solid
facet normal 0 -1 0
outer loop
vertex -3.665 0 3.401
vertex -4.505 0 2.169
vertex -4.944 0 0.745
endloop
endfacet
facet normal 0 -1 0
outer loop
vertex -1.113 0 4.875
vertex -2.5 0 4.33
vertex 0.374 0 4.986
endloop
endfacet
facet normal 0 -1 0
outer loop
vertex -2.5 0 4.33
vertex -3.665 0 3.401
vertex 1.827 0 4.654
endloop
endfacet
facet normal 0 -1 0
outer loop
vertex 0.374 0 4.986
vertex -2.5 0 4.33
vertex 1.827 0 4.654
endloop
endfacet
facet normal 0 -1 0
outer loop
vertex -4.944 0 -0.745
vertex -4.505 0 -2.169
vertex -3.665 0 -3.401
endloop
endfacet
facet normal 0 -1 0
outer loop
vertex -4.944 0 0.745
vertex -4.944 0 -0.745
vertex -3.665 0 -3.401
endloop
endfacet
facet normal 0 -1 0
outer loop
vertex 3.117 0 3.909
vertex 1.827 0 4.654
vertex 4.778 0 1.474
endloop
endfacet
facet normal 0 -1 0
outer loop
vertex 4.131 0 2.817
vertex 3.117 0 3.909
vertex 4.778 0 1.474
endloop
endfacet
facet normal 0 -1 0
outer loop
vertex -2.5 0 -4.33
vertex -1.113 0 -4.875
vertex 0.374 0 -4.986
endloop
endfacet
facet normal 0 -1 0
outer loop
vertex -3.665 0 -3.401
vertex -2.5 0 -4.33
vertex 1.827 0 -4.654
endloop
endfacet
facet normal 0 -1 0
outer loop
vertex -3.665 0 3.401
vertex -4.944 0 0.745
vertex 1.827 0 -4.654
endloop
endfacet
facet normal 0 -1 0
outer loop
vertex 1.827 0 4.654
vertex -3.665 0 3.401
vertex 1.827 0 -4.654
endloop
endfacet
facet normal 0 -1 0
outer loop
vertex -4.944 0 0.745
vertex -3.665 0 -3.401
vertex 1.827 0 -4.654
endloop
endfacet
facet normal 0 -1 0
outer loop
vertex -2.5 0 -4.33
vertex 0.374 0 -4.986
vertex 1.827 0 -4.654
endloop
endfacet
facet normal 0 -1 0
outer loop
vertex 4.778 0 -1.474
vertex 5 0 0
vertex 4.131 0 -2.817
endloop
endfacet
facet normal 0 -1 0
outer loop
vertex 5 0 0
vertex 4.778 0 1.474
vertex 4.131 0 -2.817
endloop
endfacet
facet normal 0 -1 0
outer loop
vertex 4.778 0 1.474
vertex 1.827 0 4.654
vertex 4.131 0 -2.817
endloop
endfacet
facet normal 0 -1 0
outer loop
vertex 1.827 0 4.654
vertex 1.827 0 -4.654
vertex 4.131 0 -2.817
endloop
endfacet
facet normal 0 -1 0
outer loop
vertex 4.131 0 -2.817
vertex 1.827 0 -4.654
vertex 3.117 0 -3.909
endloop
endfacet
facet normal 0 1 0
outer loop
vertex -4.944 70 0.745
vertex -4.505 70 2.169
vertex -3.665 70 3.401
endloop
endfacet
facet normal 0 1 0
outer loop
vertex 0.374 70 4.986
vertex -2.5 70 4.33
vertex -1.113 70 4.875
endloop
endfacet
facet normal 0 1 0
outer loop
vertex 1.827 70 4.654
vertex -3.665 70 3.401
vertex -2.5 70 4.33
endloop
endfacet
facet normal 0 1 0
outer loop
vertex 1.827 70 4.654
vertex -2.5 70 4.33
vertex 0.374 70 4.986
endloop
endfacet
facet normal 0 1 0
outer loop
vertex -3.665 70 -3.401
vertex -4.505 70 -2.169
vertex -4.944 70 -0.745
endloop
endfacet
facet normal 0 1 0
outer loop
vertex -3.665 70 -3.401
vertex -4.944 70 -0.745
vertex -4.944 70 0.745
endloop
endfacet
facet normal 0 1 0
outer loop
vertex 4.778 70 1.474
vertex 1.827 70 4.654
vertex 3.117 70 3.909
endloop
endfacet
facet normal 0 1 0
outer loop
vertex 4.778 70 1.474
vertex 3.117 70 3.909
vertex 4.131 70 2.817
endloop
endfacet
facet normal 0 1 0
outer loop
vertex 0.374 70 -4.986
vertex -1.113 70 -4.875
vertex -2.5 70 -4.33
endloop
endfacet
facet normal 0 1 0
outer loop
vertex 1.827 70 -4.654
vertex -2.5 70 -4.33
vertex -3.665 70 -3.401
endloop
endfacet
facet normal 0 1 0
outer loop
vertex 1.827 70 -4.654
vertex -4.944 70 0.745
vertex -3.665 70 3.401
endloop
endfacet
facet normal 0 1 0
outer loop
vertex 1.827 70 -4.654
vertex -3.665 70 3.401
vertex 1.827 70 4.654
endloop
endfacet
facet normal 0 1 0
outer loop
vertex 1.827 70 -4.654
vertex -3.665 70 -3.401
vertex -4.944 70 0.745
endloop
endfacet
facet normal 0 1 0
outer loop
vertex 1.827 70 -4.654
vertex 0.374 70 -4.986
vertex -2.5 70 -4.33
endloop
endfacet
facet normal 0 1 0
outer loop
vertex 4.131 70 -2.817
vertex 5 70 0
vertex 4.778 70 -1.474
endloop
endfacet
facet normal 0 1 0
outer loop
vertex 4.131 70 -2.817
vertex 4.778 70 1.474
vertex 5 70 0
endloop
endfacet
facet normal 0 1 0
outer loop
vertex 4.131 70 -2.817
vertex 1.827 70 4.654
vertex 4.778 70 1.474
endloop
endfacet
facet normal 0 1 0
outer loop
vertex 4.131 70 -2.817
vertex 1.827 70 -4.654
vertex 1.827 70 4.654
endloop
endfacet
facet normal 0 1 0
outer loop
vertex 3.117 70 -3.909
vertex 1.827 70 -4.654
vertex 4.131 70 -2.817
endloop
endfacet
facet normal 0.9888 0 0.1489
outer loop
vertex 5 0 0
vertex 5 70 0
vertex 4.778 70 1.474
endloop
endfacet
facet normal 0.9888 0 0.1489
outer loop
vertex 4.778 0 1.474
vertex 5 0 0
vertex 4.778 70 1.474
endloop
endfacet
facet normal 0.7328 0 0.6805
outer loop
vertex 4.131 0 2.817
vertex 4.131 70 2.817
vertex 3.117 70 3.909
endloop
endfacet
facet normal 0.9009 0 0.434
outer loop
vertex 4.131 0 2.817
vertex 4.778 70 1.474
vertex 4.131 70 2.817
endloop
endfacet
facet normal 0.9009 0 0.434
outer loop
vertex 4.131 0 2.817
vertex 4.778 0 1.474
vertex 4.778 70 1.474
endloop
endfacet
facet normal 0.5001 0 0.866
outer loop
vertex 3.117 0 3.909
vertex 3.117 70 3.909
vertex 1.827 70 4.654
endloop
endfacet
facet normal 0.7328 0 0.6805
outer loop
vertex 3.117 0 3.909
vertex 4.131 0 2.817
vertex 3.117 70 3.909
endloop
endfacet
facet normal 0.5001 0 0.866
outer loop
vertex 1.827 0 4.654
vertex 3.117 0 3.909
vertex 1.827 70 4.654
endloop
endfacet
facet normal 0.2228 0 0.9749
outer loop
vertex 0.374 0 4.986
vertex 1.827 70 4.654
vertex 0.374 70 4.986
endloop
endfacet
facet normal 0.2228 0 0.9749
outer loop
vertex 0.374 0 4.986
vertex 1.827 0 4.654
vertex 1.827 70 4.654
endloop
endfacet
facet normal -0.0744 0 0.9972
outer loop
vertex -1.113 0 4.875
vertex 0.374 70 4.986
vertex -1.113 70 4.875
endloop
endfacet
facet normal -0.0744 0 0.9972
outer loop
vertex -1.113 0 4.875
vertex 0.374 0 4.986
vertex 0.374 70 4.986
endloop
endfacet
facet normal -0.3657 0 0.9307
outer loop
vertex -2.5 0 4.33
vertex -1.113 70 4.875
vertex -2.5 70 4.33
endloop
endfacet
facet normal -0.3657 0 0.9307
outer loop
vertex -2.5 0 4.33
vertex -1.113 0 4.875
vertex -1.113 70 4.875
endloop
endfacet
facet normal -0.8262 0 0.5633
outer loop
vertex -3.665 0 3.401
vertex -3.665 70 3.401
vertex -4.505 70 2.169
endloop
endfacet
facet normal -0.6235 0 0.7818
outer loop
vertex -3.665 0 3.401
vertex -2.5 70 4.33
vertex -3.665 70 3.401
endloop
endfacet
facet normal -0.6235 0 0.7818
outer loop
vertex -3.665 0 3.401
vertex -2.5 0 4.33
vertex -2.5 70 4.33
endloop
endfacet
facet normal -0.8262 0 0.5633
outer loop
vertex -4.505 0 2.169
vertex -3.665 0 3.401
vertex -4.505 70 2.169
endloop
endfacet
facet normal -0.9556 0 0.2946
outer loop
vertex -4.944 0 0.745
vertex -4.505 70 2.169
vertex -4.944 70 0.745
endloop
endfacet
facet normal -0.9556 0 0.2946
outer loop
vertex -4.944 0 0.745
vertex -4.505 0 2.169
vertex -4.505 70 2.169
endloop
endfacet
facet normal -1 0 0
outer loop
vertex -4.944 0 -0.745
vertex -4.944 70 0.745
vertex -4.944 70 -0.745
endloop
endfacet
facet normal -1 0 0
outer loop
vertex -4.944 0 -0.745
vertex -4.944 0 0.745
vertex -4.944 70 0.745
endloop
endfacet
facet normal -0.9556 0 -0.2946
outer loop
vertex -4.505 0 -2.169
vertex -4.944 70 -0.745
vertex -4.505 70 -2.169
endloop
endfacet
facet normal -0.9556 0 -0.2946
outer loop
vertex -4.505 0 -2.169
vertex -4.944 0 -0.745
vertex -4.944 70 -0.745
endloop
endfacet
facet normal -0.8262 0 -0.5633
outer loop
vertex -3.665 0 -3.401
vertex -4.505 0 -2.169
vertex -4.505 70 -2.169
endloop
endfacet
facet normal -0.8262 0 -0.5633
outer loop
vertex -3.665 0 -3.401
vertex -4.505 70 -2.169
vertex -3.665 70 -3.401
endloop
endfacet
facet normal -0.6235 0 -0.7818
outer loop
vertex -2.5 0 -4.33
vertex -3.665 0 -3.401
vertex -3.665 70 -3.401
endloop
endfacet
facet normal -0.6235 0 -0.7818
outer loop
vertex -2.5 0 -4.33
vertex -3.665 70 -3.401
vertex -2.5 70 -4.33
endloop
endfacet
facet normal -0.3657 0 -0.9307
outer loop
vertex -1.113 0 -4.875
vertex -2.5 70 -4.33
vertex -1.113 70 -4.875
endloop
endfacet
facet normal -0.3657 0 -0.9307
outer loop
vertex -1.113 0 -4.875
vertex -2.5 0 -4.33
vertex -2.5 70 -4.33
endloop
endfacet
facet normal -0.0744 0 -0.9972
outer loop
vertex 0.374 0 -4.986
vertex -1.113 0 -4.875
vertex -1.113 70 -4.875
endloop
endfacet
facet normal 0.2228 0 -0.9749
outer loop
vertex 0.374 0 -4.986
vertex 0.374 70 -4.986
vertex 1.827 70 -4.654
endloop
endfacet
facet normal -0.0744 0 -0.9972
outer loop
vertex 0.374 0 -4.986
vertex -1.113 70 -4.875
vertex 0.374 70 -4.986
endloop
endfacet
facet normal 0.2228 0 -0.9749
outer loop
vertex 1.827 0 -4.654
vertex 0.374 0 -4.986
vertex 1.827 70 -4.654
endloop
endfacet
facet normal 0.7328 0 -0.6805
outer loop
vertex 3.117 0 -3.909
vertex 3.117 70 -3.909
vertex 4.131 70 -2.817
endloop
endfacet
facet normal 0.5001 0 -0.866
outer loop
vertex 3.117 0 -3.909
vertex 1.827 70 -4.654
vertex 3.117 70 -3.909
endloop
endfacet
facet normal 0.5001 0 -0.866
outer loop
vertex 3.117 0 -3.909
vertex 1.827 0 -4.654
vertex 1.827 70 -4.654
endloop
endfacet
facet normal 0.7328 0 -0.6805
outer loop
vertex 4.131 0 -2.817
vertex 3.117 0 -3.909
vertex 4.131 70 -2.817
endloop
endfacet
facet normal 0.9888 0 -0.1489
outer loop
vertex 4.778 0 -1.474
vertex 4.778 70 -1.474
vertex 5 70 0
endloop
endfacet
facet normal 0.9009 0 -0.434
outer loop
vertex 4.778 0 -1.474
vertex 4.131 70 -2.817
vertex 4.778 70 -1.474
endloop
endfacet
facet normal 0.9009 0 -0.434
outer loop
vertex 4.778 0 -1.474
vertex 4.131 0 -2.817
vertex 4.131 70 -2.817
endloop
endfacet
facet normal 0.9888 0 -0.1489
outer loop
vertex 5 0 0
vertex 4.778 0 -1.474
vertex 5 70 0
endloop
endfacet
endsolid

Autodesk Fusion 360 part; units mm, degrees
sketch "Sketch1" plane through (0, 0, 0) normal (0, 1, 0) x (1, 0, 0)
  circle A0 centre (0, 0) radius 5
  dimension "d1" = 10
extrude "Extrude1" add sketch "Sketch1" along normal blind 70 makes body 1
copy_body "Body->Comp1" bodies 1 removing the originals makes body 2 in component "Component"
component "Component" placed x (1, 0, 0) y (0, 1, 0) z (0, 0, 1) at (0, 0, 0)
